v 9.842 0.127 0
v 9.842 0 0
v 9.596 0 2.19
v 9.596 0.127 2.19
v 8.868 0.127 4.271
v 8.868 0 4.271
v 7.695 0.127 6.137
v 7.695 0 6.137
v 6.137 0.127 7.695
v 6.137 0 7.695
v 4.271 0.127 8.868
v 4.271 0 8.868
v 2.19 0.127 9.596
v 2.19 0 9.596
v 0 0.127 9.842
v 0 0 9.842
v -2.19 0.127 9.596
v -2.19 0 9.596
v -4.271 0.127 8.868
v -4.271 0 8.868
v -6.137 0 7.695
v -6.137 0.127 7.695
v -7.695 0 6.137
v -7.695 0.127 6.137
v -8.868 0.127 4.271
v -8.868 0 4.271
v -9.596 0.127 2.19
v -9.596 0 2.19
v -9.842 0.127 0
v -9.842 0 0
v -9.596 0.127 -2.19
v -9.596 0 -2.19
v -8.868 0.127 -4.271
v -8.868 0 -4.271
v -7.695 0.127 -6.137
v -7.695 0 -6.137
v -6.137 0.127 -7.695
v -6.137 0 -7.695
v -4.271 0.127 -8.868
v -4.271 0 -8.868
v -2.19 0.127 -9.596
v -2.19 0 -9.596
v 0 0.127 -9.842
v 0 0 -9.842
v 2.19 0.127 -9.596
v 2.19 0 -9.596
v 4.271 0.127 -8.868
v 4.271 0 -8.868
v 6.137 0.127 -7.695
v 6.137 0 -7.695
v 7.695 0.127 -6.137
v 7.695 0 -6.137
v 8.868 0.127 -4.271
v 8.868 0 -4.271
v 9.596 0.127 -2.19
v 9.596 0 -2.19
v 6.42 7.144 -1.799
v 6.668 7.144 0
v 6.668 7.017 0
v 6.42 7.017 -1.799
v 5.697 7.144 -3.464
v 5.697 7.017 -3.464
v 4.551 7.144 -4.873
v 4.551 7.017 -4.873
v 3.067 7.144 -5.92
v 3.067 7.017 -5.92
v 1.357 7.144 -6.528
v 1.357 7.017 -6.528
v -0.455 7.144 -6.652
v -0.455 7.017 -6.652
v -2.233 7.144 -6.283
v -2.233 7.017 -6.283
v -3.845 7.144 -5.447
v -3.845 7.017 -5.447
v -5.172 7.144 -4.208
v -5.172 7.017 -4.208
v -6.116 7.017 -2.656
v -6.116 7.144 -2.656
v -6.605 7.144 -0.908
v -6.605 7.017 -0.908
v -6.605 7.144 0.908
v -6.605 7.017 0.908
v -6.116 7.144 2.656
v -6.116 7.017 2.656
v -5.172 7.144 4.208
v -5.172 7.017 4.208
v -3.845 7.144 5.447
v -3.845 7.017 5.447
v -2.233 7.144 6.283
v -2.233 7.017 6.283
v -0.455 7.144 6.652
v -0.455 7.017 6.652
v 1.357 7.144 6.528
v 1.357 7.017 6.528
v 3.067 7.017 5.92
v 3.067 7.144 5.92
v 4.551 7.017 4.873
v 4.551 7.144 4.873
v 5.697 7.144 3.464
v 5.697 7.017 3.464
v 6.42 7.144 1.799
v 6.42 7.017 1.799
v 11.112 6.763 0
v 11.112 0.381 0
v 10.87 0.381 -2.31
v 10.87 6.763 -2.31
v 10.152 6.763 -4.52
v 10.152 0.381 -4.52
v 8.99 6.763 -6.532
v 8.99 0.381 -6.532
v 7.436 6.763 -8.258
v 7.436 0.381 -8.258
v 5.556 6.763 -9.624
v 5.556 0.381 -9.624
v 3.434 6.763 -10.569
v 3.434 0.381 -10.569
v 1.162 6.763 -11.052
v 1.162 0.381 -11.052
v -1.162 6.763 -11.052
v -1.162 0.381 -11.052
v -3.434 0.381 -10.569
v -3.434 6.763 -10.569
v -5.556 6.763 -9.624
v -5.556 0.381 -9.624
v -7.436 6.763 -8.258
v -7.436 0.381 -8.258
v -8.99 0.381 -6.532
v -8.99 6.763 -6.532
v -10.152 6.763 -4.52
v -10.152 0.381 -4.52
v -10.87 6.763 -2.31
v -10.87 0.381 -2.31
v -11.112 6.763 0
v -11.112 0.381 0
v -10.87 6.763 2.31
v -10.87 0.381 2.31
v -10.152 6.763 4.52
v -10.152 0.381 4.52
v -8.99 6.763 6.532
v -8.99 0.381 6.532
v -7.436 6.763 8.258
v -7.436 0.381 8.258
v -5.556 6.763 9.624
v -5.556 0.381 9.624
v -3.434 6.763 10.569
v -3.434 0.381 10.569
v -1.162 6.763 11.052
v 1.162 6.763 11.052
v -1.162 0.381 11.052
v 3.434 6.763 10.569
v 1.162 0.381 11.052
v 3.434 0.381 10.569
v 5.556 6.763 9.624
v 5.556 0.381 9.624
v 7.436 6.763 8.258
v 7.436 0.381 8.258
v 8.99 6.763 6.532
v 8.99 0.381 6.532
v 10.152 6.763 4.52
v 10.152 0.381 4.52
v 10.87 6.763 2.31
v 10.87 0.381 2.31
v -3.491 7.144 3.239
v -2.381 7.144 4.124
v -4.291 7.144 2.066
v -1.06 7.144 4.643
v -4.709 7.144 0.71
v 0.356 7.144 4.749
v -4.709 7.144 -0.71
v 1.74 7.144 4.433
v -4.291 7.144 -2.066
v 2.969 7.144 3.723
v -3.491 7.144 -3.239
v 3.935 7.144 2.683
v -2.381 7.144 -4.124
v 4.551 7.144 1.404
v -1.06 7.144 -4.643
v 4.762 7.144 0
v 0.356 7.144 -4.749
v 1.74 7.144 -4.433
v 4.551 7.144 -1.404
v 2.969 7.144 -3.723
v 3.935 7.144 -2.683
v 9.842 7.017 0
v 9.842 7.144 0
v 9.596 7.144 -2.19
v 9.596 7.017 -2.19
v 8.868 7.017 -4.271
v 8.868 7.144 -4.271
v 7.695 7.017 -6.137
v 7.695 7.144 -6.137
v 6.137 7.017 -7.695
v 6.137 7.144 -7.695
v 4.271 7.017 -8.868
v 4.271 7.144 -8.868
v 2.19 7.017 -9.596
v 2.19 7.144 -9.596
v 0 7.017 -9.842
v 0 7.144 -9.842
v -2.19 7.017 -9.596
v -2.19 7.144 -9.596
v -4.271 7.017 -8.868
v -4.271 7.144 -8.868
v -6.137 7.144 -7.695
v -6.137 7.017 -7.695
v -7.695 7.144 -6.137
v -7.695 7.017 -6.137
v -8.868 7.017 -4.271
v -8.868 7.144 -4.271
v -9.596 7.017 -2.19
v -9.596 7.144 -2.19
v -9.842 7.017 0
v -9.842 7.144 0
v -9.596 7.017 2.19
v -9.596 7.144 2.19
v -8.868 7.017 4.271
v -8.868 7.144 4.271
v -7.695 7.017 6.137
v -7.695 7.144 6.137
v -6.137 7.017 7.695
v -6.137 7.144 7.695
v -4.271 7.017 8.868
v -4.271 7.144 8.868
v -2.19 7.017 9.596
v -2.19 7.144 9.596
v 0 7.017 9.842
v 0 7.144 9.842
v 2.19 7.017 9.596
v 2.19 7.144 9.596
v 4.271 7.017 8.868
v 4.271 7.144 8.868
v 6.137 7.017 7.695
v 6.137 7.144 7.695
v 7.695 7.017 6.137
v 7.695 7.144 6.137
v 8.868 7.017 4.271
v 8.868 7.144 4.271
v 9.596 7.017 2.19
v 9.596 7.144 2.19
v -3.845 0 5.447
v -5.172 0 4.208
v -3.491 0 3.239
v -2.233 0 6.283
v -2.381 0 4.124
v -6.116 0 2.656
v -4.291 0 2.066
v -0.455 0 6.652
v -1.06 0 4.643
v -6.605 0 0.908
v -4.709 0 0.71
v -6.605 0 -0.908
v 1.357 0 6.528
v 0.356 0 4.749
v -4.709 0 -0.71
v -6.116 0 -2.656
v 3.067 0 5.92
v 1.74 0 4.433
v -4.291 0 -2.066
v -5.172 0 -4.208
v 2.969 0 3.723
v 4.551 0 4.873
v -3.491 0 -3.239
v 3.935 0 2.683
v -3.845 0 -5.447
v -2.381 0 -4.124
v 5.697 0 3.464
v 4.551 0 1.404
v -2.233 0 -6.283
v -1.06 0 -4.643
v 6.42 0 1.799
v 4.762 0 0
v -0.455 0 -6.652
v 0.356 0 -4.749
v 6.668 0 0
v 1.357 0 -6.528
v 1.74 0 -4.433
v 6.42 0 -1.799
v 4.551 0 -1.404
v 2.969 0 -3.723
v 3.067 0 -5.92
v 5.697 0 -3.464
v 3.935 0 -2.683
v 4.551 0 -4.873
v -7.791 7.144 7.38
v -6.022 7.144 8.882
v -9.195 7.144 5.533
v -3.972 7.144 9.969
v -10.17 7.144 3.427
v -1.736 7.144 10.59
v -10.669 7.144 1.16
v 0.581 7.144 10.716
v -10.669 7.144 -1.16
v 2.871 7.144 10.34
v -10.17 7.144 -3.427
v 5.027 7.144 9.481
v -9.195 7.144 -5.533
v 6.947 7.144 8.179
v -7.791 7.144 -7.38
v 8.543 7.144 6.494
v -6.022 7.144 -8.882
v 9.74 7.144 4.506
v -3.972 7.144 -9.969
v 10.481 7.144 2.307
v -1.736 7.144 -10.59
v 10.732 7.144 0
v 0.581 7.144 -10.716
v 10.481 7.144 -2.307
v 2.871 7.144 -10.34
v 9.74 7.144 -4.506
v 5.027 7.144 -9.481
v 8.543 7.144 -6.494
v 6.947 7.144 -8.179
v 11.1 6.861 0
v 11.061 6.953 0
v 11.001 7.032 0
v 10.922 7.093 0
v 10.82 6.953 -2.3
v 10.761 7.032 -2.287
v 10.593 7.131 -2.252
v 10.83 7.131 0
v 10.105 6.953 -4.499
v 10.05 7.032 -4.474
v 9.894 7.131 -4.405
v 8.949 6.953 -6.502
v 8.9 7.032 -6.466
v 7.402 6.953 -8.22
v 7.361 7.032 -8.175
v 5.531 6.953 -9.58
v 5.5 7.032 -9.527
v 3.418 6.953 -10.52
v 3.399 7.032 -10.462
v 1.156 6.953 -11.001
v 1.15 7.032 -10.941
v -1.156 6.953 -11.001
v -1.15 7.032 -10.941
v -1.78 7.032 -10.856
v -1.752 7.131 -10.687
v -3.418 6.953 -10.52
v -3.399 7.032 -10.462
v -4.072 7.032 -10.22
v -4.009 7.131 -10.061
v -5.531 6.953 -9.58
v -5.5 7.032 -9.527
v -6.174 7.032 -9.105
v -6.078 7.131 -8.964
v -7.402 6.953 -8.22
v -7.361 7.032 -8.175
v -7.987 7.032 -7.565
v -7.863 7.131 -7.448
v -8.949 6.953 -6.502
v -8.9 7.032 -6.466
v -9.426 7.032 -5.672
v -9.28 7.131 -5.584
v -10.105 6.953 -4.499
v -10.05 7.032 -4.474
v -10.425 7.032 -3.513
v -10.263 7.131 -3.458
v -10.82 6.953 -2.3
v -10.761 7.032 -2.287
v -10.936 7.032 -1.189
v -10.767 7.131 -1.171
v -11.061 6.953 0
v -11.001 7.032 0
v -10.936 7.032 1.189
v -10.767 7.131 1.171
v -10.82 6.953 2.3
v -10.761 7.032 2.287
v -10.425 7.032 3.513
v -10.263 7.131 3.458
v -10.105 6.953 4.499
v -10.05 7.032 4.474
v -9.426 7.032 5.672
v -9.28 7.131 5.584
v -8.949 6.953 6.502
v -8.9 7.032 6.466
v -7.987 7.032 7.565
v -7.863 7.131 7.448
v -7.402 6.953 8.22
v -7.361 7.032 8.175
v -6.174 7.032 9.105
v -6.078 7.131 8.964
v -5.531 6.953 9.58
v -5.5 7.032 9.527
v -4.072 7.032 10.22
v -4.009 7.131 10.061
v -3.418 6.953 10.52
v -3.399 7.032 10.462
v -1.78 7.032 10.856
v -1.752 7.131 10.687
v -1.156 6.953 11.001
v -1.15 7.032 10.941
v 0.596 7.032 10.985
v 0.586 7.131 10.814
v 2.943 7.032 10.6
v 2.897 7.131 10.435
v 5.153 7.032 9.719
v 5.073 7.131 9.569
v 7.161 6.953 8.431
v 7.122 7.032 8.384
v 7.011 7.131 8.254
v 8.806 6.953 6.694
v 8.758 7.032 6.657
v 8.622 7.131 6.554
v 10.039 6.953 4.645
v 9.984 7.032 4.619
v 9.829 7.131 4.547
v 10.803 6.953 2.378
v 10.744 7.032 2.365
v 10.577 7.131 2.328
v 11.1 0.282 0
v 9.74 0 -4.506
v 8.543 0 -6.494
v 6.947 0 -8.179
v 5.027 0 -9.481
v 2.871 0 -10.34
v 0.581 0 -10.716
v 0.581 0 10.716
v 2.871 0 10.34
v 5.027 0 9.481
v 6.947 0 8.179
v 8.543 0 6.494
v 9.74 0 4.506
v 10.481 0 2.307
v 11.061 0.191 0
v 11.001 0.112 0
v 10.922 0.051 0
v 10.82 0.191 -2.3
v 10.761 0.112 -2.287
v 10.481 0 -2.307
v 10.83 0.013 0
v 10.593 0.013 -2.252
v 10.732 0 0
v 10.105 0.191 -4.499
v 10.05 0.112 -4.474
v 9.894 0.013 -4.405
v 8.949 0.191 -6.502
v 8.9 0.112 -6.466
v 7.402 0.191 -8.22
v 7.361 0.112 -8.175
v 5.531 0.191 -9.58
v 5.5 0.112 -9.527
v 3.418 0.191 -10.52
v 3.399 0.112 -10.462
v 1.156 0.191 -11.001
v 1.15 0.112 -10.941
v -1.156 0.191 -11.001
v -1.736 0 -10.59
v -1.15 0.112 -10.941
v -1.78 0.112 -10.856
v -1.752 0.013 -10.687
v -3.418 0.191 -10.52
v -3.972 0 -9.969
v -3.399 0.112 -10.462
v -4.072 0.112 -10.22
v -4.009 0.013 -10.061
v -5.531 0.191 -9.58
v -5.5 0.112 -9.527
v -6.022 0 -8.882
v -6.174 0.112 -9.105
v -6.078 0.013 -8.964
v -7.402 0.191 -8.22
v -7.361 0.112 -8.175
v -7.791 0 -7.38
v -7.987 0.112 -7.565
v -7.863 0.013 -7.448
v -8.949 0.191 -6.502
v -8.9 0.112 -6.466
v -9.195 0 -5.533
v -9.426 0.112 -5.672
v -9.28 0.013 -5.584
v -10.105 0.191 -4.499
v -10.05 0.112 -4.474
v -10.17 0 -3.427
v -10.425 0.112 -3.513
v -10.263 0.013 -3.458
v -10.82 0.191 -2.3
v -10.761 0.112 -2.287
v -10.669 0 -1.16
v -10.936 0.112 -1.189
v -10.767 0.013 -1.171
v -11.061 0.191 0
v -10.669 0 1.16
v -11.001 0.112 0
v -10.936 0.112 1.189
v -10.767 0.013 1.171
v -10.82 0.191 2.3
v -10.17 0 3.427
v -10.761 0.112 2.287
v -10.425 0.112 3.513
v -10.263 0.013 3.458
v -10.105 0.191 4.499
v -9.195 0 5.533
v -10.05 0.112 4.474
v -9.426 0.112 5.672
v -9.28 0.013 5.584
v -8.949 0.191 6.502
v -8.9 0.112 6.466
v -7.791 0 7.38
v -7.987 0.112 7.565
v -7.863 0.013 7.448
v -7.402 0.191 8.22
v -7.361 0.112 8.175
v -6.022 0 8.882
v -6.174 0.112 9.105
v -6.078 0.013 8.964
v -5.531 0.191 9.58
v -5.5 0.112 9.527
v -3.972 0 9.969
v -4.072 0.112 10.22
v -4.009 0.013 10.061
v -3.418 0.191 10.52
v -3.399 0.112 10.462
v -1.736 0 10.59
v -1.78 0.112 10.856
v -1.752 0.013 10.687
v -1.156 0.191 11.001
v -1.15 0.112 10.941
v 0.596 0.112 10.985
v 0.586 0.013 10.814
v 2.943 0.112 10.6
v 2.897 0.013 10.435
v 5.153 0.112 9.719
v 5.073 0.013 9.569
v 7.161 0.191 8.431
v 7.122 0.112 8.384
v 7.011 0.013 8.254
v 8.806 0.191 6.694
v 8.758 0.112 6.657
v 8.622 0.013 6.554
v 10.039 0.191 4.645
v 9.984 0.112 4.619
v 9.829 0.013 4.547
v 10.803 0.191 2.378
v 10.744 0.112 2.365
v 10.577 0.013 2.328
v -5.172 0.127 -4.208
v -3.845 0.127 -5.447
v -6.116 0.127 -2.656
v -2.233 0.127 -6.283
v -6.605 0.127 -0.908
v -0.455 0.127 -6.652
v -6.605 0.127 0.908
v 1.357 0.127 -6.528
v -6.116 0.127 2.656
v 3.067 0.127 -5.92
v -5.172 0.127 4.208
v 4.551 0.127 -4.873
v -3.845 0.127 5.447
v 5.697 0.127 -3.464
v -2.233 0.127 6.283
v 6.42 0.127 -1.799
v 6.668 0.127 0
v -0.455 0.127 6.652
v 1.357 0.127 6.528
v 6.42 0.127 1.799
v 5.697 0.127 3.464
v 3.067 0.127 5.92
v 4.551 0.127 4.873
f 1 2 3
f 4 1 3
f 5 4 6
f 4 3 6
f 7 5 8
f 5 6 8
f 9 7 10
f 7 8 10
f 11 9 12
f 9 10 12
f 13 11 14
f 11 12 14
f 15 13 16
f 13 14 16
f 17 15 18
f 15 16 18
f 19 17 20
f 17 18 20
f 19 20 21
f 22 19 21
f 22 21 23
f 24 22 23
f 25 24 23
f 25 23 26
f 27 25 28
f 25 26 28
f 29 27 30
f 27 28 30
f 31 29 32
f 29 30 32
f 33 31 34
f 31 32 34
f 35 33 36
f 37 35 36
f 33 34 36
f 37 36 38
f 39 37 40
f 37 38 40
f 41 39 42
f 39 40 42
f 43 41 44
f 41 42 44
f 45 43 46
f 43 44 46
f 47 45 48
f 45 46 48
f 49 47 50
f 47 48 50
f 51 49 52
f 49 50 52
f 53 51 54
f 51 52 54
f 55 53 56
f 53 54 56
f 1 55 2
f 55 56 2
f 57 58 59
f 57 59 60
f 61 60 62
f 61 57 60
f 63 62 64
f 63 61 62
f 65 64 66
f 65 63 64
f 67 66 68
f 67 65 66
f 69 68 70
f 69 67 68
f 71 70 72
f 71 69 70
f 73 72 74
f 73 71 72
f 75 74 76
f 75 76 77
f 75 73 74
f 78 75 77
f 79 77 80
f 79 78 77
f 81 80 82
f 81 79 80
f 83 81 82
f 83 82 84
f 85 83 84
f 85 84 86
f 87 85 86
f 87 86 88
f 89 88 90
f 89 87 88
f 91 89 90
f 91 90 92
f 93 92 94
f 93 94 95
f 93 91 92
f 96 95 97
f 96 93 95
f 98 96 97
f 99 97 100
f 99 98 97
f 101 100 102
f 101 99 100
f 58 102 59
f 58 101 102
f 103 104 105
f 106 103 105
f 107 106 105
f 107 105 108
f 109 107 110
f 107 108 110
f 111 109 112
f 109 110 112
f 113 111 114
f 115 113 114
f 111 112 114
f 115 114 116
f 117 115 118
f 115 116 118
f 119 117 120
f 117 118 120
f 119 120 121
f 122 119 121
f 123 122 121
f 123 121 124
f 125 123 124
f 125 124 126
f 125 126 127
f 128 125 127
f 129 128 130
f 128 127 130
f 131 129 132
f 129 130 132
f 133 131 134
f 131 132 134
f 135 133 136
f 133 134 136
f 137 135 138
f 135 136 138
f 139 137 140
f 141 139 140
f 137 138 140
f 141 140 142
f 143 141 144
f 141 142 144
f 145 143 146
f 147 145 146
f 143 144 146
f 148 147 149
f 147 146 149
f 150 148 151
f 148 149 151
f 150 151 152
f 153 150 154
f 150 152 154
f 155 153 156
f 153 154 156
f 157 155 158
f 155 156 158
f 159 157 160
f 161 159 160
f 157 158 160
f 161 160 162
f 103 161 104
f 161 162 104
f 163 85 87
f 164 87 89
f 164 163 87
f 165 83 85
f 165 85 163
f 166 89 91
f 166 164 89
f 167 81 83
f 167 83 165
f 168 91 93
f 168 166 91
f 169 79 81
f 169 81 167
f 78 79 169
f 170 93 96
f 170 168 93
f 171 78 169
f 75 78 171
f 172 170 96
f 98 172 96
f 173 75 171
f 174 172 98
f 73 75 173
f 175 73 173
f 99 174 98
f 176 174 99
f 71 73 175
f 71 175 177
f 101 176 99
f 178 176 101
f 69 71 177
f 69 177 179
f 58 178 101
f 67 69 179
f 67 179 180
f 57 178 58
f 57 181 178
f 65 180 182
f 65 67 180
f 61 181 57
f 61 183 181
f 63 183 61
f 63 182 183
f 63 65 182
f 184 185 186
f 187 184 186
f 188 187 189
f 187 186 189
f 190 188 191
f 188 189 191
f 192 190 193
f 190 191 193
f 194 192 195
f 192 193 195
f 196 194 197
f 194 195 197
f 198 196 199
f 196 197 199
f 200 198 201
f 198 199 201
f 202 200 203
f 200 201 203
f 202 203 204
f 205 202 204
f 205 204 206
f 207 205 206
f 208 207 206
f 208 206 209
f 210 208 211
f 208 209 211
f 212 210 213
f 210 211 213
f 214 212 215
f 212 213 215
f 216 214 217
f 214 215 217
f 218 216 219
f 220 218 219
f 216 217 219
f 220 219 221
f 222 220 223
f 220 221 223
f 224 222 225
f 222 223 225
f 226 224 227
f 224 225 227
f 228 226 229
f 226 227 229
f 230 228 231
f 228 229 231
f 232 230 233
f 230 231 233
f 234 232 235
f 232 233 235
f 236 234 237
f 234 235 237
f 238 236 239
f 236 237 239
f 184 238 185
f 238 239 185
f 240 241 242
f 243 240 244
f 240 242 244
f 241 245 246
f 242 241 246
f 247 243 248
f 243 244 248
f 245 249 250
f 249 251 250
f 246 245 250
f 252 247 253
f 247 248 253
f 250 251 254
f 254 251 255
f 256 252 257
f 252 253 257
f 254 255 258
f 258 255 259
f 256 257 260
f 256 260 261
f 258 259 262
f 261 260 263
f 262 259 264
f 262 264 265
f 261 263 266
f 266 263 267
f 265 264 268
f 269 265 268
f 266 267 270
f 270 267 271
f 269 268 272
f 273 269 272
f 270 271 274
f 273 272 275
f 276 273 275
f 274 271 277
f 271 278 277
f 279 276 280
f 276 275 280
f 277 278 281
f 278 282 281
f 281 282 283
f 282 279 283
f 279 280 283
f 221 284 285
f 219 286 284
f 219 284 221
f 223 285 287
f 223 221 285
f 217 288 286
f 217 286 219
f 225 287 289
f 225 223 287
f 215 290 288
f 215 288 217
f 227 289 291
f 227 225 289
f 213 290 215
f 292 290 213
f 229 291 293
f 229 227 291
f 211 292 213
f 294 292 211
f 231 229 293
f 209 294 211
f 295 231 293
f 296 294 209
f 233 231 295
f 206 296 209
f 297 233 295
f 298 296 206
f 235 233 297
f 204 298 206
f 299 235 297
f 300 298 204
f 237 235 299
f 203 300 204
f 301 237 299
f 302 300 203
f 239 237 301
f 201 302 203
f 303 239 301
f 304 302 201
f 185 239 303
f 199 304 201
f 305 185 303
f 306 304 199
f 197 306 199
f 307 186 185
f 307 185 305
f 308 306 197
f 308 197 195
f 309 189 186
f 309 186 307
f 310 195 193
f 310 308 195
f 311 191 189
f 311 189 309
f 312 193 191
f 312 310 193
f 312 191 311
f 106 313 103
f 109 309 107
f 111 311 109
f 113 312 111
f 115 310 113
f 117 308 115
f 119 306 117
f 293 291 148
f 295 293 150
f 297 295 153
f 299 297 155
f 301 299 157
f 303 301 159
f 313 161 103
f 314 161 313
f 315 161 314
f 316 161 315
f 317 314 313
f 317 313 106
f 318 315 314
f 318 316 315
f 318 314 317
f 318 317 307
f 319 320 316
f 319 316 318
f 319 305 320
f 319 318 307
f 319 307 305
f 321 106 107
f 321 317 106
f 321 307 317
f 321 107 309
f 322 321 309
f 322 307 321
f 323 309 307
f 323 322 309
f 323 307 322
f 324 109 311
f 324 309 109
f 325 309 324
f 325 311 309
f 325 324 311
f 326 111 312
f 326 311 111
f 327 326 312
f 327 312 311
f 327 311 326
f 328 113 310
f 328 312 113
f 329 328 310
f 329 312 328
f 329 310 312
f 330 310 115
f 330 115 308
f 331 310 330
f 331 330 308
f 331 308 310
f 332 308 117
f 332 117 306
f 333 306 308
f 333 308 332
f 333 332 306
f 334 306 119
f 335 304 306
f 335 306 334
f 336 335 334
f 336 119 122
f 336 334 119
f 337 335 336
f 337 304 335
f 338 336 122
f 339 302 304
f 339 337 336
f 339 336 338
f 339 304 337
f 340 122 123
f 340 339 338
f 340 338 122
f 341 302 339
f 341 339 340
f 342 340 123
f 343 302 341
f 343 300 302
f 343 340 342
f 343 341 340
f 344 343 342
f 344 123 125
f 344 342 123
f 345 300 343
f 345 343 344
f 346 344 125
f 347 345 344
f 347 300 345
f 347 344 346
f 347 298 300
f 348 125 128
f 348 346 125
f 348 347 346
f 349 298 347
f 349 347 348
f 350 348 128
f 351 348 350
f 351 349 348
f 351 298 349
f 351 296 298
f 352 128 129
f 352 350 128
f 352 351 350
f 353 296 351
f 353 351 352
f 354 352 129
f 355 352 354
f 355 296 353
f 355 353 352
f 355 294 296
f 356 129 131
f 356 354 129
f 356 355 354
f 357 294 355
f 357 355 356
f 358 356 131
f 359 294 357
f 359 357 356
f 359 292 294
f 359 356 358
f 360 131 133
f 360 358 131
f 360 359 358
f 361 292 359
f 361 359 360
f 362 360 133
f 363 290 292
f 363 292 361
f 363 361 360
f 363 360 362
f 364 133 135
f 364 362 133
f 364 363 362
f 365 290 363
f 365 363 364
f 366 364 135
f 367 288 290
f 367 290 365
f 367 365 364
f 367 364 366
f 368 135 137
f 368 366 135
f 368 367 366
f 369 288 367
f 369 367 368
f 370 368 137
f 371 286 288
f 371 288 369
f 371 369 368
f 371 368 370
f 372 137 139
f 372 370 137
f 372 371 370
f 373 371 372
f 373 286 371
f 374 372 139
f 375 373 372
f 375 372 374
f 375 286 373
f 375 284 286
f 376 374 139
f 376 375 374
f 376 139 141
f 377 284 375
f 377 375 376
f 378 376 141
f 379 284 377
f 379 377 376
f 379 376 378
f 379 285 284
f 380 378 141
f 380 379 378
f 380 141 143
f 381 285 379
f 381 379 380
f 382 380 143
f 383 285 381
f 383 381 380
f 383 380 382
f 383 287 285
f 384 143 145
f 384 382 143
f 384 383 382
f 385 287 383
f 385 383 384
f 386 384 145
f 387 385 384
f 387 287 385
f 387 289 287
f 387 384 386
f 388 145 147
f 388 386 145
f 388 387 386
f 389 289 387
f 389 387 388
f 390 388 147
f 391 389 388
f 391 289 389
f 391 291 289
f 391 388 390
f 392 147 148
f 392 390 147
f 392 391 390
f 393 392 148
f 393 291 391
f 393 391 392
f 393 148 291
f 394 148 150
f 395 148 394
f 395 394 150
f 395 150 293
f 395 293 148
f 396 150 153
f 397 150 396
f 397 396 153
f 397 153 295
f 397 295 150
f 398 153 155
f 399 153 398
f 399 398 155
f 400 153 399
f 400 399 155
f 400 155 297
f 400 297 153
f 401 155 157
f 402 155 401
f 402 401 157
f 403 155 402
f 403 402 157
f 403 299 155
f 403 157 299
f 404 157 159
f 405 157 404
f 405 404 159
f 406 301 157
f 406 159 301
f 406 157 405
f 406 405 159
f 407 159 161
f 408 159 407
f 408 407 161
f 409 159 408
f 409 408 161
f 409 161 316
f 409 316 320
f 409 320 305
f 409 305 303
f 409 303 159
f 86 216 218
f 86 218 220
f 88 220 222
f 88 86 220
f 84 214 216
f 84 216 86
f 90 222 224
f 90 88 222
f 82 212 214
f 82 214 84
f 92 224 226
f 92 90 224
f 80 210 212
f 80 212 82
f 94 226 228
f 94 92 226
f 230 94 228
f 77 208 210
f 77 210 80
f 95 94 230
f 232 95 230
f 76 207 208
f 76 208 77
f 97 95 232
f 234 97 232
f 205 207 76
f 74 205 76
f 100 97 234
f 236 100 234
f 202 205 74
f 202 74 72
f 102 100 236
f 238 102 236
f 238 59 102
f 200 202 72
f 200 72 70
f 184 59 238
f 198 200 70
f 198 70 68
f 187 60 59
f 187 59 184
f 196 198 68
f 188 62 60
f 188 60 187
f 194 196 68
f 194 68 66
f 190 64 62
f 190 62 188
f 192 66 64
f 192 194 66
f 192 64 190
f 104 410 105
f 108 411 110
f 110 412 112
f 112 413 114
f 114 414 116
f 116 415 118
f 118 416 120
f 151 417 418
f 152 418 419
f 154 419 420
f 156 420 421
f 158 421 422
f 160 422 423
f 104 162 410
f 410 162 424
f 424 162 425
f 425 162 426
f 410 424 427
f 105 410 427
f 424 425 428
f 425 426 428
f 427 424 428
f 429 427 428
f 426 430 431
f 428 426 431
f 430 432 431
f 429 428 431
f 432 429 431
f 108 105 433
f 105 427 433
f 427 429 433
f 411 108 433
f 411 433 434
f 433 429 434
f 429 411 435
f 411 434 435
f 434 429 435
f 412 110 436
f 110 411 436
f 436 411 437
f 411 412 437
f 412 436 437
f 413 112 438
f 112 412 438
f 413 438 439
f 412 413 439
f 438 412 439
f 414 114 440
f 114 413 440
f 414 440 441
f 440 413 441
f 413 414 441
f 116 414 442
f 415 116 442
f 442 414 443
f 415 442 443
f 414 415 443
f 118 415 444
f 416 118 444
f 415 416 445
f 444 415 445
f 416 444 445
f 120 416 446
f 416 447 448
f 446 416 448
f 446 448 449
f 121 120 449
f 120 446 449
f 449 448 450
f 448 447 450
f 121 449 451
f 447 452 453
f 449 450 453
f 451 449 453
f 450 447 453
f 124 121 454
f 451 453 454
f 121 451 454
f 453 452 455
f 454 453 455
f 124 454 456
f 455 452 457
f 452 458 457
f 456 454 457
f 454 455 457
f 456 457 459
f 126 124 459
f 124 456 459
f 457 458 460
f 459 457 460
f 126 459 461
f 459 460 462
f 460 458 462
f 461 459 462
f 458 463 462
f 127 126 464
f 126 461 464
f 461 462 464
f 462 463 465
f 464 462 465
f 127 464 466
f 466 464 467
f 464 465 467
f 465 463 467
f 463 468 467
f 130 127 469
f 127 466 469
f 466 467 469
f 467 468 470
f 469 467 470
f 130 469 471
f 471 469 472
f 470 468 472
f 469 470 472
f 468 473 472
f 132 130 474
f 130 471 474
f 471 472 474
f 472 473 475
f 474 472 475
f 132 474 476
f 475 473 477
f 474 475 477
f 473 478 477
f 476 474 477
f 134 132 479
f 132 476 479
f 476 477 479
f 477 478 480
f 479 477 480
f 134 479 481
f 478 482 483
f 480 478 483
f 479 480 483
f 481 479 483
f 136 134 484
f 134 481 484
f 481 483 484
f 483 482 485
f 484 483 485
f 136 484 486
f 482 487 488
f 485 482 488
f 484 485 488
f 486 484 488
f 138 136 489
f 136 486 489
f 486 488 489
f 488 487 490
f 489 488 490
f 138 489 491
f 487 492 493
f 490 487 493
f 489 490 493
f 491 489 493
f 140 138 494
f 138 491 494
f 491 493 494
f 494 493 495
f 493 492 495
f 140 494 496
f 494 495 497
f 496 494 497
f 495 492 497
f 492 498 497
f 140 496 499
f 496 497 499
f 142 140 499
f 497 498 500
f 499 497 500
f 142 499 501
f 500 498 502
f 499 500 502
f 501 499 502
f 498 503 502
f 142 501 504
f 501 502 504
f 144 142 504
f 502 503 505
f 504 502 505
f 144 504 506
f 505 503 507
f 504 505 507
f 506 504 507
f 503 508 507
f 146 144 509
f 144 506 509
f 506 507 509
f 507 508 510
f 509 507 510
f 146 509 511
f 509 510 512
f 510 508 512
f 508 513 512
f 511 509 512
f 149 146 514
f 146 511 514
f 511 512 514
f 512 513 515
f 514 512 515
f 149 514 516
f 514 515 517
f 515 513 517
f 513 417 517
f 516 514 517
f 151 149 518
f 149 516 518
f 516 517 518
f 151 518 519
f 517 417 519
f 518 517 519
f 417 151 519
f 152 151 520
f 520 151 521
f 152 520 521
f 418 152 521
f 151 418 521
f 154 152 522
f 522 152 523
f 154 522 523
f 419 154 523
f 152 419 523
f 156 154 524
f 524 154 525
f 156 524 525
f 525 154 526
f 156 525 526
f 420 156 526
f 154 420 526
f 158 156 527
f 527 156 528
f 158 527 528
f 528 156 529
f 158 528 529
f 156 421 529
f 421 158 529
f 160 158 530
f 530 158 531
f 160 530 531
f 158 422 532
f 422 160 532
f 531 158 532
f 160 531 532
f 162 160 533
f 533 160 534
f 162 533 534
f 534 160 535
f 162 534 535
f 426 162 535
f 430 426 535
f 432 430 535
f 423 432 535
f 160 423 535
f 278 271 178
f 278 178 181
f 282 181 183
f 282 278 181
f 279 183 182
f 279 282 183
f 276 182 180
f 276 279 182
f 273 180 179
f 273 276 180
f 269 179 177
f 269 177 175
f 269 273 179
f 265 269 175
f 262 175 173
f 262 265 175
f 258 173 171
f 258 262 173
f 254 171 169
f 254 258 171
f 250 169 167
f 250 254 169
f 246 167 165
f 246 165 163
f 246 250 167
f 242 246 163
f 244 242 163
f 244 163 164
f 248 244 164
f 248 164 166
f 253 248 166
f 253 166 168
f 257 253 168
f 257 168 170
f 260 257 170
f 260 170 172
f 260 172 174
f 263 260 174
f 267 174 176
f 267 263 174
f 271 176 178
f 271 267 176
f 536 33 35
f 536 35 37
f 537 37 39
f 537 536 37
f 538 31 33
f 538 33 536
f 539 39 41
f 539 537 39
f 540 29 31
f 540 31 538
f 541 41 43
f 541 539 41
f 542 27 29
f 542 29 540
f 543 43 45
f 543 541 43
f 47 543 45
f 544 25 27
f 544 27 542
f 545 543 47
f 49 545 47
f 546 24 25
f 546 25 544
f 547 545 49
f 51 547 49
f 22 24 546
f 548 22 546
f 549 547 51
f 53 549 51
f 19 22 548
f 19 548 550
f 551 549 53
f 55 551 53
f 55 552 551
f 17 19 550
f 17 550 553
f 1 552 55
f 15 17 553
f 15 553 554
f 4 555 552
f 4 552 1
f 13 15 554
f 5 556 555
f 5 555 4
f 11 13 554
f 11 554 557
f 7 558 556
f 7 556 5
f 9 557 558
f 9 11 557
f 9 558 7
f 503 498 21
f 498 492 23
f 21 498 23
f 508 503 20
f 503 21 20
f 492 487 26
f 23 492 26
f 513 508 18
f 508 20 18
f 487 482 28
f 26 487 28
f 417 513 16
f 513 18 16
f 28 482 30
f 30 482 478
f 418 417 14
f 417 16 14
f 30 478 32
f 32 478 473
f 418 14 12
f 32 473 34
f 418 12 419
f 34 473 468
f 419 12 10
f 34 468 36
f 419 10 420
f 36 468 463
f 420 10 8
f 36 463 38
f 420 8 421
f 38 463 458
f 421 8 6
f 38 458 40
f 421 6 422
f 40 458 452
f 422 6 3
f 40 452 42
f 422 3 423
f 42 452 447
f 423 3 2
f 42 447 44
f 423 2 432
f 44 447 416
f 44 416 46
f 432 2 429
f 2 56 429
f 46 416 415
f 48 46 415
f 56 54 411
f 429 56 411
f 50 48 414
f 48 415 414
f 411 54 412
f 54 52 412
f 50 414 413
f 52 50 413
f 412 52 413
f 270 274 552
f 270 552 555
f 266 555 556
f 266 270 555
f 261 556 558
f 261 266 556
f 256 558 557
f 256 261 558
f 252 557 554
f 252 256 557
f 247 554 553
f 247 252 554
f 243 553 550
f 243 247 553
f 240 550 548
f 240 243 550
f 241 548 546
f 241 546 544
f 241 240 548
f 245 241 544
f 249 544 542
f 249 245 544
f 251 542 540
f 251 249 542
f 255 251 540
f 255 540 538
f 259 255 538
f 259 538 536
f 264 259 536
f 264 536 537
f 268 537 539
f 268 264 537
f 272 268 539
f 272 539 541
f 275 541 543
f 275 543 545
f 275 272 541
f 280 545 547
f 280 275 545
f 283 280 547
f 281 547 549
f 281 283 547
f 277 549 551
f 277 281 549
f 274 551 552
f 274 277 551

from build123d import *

# Parameters (mm, degrees)
SKETCH1_R           = 11.1125
SKETCH1_R_2         = 4.7625
BOSS_EXTRUDE1_DEPTH = 7.14375
SKETCH2_R           = 9.8425
SKETCH2_R_2         = 6.6675
CUT_EXTRUDE1_DEPTH  = 0.127
SKETCH3_R           = 9.8425
SKETCH3_R_2         = 6.6675
CUT_EXTRUDE3_DEPTH  = 0.127
FILLET1_R           = 0.381


with BuildPart() as part:
    # Sketch1 → Boss-Extrude1 (new body)
    with BuildSketch(Plane(origin=(0, 0, 0), x_dir=(1, 0, 0), z_dir=(0, 1, 0))):
        Circle(SKETCH1_R)
        Circle(SKETCH1_R_2, mode=Mode.SUBTRACT)
    extrude(amount=BOSS_EXTRUDE1_DEPTH)

    # Sketch2 → Cut-Extrude1 (cut)
    with BuildSketch(Plane(origin=(0, 7.14375, 0), x_dir=(1, 0, 0), z_dir=(0, 1, 0))):
        Circle(SKETCH2_R)
        Circle(SKETCH2_R_2, mode=Mode.SUBTRACT)
    extrude(amount=-CUT_EXTRUDE1_DEPTH, mode=Mode.SUBTRACT)

    # Sketch3 → Cut-Extrude3 (cut)
    with BuildSketch(Plane.XZ):
        Circle(SKETCH3_R)
        Circle(SKETCH3_R_2, mode=Mode.SUBTRACT)
    extrude(amount=-CUT_EXTRUDE3_DEPTH, mode=Mode.SUBTRACT)

    # Fillet1
    fillet1_edges = [part.edges().sort_by_distance(p)[0] for p in [
        (-11.1125, 0, 0),
        (-11.1125, 7.14375, 0),
    ]]
    fillet(fillet1_edges, radius=FILLET1_R)


solid = part.part
